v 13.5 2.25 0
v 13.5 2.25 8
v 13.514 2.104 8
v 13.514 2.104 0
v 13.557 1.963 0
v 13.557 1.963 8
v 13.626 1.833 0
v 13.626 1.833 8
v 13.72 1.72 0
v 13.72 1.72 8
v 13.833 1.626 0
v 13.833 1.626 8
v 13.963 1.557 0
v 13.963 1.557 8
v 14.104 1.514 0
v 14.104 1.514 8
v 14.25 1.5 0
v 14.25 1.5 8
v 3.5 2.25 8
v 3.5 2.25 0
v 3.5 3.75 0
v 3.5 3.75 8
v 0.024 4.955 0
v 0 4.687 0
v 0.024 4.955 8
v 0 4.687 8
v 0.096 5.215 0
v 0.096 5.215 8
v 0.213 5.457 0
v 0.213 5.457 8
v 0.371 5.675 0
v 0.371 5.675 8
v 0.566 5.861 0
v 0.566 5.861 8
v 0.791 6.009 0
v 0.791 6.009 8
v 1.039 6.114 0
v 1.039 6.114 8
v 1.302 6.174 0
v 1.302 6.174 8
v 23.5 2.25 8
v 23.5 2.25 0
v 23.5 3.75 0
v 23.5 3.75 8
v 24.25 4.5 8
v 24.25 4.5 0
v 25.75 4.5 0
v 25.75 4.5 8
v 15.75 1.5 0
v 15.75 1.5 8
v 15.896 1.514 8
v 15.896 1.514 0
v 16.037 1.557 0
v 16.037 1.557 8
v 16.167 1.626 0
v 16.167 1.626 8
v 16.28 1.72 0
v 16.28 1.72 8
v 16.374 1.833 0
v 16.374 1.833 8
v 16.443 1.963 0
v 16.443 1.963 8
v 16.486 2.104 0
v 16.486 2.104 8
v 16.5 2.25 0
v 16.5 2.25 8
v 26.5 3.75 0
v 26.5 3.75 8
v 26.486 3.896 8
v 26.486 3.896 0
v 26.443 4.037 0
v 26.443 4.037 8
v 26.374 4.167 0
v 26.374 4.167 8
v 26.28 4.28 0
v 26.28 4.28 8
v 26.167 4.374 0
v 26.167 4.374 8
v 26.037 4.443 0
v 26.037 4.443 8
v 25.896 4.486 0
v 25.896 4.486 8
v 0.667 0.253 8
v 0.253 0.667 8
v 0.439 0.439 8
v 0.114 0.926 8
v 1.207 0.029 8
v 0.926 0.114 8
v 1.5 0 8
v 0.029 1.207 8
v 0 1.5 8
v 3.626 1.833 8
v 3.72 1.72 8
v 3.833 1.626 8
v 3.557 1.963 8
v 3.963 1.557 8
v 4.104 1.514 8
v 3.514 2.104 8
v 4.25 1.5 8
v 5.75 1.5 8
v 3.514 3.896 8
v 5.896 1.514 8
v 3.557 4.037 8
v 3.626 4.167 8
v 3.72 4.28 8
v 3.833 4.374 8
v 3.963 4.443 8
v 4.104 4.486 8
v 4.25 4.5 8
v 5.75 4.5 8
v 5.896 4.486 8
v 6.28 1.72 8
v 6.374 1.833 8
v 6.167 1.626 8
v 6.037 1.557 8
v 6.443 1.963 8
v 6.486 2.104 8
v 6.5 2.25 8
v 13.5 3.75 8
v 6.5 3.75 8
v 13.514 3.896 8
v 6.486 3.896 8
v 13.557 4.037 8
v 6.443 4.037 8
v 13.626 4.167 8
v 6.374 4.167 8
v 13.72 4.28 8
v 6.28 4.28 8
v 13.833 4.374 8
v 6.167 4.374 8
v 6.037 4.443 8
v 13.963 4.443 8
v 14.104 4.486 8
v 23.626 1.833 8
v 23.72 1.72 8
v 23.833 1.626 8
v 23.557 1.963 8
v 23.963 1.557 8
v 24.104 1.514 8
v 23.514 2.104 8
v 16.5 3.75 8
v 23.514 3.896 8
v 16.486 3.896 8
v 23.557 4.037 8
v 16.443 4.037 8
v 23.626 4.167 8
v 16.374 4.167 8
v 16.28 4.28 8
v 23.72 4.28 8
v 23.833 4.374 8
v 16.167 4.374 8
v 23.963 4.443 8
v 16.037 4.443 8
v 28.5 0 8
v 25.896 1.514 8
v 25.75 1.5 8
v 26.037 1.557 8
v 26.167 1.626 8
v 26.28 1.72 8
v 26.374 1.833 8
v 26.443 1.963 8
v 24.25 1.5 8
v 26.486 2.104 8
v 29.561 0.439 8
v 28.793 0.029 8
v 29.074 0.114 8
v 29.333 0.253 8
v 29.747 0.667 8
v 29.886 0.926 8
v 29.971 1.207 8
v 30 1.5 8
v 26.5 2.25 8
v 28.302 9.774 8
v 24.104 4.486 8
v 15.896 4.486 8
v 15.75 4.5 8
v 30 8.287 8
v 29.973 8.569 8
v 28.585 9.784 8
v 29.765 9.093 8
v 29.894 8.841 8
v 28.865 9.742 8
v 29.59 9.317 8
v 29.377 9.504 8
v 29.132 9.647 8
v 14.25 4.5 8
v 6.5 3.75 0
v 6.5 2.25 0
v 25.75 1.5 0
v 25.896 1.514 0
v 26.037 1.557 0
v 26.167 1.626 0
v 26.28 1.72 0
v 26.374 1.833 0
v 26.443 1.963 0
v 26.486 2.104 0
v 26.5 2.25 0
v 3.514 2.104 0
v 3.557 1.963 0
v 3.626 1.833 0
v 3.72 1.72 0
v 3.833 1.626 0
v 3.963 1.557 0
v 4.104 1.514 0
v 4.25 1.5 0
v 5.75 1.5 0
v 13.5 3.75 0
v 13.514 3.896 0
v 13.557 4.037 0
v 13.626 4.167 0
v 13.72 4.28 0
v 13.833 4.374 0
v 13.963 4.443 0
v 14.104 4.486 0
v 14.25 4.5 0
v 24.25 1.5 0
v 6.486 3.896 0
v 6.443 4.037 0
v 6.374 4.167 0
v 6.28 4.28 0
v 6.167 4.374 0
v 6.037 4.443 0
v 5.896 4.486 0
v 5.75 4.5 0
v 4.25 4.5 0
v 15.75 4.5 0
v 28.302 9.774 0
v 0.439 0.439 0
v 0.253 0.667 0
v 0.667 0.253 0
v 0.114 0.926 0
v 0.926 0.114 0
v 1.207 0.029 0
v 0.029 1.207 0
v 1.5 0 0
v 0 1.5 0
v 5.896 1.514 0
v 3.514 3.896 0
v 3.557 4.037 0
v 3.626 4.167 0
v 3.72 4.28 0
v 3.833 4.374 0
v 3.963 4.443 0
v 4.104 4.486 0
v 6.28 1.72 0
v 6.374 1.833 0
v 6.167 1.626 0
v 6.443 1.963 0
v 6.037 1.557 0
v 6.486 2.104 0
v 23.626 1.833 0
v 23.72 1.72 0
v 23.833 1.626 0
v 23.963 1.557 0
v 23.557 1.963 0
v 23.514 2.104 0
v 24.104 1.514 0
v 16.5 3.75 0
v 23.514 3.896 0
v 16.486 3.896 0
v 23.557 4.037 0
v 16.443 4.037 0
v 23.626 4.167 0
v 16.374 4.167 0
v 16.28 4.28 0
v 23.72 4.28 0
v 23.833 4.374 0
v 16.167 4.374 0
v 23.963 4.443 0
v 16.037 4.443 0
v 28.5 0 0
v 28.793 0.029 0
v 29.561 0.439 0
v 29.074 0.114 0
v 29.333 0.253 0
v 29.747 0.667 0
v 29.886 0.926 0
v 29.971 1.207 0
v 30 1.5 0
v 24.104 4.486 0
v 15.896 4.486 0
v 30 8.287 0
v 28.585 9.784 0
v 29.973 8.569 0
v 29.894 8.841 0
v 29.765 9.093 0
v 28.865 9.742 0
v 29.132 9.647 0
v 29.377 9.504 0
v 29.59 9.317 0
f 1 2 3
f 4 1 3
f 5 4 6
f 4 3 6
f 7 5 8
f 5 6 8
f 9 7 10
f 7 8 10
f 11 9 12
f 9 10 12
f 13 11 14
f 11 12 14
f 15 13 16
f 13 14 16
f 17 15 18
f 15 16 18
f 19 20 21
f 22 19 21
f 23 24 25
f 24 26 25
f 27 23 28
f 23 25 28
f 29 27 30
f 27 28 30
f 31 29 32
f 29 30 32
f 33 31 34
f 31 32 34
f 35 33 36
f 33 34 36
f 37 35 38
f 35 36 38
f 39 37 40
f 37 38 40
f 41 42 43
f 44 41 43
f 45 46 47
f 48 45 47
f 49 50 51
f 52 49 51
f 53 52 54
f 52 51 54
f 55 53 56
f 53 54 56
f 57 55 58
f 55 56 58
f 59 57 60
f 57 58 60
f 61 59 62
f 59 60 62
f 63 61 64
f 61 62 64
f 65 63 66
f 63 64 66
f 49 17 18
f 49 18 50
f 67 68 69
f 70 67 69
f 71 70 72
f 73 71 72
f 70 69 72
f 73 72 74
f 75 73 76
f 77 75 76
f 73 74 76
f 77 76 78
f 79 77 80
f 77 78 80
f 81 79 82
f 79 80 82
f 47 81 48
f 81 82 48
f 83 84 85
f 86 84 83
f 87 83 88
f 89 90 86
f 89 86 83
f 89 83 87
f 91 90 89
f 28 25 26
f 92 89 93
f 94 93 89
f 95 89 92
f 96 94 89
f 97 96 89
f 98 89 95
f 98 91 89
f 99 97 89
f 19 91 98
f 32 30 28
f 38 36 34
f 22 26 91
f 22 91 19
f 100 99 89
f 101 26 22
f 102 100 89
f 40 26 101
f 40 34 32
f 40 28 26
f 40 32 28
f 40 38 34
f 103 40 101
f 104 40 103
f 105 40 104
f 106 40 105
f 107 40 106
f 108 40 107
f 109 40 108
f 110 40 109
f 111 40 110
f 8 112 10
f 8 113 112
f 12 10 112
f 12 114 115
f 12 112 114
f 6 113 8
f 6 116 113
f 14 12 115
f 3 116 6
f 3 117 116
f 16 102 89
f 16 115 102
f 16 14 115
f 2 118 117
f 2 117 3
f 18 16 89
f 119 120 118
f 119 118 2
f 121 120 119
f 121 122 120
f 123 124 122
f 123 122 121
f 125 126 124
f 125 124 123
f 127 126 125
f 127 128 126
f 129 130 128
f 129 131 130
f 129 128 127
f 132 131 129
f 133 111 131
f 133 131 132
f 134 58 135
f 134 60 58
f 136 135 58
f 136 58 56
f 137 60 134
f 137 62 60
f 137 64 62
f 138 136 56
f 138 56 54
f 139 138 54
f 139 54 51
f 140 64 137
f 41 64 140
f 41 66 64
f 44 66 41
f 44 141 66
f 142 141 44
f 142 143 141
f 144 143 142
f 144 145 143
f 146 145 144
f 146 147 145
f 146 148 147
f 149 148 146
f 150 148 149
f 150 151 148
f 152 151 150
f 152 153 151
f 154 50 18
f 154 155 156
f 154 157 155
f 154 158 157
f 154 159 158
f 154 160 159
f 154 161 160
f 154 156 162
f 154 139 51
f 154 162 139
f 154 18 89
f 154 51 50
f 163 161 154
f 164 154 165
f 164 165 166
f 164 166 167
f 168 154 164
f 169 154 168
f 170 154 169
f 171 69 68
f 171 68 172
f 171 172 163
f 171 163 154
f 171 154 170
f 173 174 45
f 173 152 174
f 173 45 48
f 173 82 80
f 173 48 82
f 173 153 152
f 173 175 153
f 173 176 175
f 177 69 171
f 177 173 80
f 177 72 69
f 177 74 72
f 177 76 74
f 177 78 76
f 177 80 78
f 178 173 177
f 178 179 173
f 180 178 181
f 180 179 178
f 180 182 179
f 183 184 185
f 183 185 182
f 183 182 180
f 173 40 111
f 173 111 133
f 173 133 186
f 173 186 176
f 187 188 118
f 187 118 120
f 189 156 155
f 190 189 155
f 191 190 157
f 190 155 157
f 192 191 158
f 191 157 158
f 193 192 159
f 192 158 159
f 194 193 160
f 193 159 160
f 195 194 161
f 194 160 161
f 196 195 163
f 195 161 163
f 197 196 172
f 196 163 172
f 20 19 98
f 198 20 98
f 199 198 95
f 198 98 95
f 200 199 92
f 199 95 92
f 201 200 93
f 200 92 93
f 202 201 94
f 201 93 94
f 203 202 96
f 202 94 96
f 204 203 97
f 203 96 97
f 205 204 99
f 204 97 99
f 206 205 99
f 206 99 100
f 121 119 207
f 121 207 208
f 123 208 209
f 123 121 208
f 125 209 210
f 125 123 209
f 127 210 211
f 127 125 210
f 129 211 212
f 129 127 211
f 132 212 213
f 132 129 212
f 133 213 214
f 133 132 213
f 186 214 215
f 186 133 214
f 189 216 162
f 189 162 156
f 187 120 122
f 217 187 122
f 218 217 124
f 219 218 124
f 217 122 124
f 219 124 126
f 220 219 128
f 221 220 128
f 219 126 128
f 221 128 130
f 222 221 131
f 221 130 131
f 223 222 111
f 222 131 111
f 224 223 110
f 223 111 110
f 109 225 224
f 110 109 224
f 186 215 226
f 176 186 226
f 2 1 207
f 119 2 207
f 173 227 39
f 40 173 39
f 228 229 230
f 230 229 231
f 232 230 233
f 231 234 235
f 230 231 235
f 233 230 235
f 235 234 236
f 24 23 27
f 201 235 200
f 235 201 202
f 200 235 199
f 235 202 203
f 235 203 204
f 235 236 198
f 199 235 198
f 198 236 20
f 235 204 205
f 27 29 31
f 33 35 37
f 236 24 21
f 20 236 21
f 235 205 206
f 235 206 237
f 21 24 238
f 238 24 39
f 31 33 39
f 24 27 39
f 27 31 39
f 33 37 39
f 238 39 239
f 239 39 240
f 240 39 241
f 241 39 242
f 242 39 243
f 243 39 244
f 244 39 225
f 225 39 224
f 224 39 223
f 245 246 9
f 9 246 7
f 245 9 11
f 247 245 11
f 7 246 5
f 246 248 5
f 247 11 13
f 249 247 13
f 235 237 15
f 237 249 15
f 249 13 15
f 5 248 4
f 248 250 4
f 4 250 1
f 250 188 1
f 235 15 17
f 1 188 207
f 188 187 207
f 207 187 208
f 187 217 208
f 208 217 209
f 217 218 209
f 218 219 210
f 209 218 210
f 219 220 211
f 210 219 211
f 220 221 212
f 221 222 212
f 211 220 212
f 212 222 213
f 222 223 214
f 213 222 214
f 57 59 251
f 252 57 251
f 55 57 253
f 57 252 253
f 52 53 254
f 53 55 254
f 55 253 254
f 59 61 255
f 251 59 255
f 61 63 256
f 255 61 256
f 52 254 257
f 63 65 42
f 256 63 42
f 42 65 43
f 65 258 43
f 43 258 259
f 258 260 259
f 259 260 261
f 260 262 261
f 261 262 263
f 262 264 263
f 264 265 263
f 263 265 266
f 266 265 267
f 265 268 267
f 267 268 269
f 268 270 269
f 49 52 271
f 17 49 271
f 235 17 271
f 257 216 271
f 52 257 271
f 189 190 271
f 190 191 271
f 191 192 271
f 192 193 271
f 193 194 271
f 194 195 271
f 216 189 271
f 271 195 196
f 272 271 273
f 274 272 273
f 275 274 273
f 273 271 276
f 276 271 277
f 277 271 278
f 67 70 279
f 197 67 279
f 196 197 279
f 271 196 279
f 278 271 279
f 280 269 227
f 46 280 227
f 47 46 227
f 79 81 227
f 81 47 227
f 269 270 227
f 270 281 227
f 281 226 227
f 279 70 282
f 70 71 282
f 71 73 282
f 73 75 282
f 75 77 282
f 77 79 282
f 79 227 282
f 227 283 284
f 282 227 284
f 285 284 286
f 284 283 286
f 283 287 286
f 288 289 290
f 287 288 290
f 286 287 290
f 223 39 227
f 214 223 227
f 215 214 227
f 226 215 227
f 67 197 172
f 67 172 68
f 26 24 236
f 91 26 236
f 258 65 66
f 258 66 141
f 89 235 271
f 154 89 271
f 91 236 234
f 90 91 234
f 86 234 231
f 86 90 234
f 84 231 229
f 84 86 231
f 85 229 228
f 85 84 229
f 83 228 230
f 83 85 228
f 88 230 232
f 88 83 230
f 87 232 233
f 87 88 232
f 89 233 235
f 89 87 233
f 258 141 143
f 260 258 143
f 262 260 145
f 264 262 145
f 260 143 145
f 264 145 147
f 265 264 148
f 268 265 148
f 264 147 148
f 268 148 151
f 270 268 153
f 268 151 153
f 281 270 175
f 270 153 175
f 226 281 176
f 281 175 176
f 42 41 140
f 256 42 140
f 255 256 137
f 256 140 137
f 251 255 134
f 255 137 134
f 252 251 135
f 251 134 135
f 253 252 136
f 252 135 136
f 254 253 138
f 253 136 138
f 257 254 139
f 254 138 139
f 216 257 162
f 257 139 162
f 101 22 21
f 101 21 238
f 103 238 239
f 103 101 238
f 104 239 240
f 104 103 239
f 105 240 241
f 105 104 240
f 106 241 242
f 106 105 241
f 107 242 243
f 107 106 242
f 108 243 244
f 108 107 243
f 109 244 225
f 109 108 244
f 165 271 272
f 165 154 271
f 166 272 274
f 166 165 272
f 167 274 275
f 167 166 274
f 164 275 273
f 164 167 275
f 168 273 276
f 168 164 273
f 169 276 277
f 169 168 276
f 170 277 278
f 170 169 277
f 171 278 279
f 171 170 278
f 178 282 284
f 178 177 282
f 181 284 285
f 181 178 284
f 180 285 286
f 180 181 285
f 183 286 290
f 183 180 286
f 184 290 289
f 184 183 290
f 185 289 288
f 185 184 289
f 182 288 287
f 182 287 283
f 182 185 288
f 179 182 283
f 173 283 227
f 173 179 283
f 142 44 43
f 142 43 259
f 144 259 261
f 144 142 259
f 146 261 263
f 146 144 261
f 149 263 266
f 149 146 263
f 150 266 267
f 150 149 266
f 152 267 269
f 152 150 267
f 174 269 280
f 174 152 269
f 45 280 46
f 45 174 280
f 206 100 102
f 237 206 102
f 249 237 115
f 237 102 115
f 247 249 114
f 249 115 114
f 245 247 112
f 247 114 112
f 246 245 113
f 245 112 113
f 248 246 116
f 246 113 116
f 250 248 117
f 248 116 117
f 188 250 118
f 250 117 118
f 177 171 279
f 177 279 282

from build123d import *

# Parameters (mm, degrees)
F1_DEPTH = 8
F2_R     = 1.5
F3_W     = 3
F3_H     = 3
F4_DEPTH = 9
F5_R     = 0.75


with BuildPart() as f1:
    # F0 (on Top) → F1 (new body)
    with BuildSketch(Plane.XY):
        Polygon((0, 6), (0, 0), (30, 0), (30, 10), align=None)
    extrude(amount=F1_DEPTH)

    # F2
    f2_edges = [f1.edges().sort_by_distance(p)[0] for p in [
        (30, 0, 4),
        (0, 0, 4),
        (30, 10, 4),
        (0, 6, 4),
    ]]
    fillet(f2_edges, radius=F2_R)


with BuildPart() as f4:
    # F3 (on Top) → F4 (new body)
    with BuildSketch(Plane.XY):
        Rectangle(F3_W, F3_H)
    extrude(amount=F4_DEPTH)

    # F5
    f5_edges = [f4.edges().sort_by_distance(p)[0] for p in [
        (1.5, -1.5, 4.5),
        (-1.5, -1.5, 4.5),
        (1.5, 1.5, 4.5),
        (-1.5, 1.5, 4.5),
    ]]
    fillet(f5_edges, radius=F5_R)


with BuildPart() as f4_1:
    # F6: moved
    add(f4.part.moved(Location((25, 4, 0))))


with BuildPart() as f7_1:
    # F7: copy of F4
    add(f4_1.part)


with BuildPart() as f7_1_1:
    # F8: moved
    add(f7_1.part.moved(Location((-10, 0, 0))))


with BuildPart() as f9_1:
    # F9: copy of F7_1
    add(f7_1_1.part)


with BuildPart() as f9_1_1:
    # F10: moved
    add(f9_1.part.moved(Location((-10, 0, 0))))


with BuildPart() as f4_2:
    # F11: moved
    add(f4_1.part.moved(Location((0, -1, 0))))


with BuildPart() as f7_1_2:
    # F11: moved
    add(f7_1_1.part.moved(Location((0, -1, 0))))


with BuildPart() as f9_1_2:
    # F11: moved
    add(f9_1_1.part.moved(Location((0, -1, 0))))


with BuildPart() as f1_1:
    add(f1.part)

    # F12: cut F7_1, F4, F9_1
    add(f7_1_2.part, mode=Mode.SUBTRACT)
    add(f4_2.part, mode=Mode.SUBTRACT)
    add(f9_1_2.part, mode=Mode.SUBTRACT)


solid = f1_1.part
